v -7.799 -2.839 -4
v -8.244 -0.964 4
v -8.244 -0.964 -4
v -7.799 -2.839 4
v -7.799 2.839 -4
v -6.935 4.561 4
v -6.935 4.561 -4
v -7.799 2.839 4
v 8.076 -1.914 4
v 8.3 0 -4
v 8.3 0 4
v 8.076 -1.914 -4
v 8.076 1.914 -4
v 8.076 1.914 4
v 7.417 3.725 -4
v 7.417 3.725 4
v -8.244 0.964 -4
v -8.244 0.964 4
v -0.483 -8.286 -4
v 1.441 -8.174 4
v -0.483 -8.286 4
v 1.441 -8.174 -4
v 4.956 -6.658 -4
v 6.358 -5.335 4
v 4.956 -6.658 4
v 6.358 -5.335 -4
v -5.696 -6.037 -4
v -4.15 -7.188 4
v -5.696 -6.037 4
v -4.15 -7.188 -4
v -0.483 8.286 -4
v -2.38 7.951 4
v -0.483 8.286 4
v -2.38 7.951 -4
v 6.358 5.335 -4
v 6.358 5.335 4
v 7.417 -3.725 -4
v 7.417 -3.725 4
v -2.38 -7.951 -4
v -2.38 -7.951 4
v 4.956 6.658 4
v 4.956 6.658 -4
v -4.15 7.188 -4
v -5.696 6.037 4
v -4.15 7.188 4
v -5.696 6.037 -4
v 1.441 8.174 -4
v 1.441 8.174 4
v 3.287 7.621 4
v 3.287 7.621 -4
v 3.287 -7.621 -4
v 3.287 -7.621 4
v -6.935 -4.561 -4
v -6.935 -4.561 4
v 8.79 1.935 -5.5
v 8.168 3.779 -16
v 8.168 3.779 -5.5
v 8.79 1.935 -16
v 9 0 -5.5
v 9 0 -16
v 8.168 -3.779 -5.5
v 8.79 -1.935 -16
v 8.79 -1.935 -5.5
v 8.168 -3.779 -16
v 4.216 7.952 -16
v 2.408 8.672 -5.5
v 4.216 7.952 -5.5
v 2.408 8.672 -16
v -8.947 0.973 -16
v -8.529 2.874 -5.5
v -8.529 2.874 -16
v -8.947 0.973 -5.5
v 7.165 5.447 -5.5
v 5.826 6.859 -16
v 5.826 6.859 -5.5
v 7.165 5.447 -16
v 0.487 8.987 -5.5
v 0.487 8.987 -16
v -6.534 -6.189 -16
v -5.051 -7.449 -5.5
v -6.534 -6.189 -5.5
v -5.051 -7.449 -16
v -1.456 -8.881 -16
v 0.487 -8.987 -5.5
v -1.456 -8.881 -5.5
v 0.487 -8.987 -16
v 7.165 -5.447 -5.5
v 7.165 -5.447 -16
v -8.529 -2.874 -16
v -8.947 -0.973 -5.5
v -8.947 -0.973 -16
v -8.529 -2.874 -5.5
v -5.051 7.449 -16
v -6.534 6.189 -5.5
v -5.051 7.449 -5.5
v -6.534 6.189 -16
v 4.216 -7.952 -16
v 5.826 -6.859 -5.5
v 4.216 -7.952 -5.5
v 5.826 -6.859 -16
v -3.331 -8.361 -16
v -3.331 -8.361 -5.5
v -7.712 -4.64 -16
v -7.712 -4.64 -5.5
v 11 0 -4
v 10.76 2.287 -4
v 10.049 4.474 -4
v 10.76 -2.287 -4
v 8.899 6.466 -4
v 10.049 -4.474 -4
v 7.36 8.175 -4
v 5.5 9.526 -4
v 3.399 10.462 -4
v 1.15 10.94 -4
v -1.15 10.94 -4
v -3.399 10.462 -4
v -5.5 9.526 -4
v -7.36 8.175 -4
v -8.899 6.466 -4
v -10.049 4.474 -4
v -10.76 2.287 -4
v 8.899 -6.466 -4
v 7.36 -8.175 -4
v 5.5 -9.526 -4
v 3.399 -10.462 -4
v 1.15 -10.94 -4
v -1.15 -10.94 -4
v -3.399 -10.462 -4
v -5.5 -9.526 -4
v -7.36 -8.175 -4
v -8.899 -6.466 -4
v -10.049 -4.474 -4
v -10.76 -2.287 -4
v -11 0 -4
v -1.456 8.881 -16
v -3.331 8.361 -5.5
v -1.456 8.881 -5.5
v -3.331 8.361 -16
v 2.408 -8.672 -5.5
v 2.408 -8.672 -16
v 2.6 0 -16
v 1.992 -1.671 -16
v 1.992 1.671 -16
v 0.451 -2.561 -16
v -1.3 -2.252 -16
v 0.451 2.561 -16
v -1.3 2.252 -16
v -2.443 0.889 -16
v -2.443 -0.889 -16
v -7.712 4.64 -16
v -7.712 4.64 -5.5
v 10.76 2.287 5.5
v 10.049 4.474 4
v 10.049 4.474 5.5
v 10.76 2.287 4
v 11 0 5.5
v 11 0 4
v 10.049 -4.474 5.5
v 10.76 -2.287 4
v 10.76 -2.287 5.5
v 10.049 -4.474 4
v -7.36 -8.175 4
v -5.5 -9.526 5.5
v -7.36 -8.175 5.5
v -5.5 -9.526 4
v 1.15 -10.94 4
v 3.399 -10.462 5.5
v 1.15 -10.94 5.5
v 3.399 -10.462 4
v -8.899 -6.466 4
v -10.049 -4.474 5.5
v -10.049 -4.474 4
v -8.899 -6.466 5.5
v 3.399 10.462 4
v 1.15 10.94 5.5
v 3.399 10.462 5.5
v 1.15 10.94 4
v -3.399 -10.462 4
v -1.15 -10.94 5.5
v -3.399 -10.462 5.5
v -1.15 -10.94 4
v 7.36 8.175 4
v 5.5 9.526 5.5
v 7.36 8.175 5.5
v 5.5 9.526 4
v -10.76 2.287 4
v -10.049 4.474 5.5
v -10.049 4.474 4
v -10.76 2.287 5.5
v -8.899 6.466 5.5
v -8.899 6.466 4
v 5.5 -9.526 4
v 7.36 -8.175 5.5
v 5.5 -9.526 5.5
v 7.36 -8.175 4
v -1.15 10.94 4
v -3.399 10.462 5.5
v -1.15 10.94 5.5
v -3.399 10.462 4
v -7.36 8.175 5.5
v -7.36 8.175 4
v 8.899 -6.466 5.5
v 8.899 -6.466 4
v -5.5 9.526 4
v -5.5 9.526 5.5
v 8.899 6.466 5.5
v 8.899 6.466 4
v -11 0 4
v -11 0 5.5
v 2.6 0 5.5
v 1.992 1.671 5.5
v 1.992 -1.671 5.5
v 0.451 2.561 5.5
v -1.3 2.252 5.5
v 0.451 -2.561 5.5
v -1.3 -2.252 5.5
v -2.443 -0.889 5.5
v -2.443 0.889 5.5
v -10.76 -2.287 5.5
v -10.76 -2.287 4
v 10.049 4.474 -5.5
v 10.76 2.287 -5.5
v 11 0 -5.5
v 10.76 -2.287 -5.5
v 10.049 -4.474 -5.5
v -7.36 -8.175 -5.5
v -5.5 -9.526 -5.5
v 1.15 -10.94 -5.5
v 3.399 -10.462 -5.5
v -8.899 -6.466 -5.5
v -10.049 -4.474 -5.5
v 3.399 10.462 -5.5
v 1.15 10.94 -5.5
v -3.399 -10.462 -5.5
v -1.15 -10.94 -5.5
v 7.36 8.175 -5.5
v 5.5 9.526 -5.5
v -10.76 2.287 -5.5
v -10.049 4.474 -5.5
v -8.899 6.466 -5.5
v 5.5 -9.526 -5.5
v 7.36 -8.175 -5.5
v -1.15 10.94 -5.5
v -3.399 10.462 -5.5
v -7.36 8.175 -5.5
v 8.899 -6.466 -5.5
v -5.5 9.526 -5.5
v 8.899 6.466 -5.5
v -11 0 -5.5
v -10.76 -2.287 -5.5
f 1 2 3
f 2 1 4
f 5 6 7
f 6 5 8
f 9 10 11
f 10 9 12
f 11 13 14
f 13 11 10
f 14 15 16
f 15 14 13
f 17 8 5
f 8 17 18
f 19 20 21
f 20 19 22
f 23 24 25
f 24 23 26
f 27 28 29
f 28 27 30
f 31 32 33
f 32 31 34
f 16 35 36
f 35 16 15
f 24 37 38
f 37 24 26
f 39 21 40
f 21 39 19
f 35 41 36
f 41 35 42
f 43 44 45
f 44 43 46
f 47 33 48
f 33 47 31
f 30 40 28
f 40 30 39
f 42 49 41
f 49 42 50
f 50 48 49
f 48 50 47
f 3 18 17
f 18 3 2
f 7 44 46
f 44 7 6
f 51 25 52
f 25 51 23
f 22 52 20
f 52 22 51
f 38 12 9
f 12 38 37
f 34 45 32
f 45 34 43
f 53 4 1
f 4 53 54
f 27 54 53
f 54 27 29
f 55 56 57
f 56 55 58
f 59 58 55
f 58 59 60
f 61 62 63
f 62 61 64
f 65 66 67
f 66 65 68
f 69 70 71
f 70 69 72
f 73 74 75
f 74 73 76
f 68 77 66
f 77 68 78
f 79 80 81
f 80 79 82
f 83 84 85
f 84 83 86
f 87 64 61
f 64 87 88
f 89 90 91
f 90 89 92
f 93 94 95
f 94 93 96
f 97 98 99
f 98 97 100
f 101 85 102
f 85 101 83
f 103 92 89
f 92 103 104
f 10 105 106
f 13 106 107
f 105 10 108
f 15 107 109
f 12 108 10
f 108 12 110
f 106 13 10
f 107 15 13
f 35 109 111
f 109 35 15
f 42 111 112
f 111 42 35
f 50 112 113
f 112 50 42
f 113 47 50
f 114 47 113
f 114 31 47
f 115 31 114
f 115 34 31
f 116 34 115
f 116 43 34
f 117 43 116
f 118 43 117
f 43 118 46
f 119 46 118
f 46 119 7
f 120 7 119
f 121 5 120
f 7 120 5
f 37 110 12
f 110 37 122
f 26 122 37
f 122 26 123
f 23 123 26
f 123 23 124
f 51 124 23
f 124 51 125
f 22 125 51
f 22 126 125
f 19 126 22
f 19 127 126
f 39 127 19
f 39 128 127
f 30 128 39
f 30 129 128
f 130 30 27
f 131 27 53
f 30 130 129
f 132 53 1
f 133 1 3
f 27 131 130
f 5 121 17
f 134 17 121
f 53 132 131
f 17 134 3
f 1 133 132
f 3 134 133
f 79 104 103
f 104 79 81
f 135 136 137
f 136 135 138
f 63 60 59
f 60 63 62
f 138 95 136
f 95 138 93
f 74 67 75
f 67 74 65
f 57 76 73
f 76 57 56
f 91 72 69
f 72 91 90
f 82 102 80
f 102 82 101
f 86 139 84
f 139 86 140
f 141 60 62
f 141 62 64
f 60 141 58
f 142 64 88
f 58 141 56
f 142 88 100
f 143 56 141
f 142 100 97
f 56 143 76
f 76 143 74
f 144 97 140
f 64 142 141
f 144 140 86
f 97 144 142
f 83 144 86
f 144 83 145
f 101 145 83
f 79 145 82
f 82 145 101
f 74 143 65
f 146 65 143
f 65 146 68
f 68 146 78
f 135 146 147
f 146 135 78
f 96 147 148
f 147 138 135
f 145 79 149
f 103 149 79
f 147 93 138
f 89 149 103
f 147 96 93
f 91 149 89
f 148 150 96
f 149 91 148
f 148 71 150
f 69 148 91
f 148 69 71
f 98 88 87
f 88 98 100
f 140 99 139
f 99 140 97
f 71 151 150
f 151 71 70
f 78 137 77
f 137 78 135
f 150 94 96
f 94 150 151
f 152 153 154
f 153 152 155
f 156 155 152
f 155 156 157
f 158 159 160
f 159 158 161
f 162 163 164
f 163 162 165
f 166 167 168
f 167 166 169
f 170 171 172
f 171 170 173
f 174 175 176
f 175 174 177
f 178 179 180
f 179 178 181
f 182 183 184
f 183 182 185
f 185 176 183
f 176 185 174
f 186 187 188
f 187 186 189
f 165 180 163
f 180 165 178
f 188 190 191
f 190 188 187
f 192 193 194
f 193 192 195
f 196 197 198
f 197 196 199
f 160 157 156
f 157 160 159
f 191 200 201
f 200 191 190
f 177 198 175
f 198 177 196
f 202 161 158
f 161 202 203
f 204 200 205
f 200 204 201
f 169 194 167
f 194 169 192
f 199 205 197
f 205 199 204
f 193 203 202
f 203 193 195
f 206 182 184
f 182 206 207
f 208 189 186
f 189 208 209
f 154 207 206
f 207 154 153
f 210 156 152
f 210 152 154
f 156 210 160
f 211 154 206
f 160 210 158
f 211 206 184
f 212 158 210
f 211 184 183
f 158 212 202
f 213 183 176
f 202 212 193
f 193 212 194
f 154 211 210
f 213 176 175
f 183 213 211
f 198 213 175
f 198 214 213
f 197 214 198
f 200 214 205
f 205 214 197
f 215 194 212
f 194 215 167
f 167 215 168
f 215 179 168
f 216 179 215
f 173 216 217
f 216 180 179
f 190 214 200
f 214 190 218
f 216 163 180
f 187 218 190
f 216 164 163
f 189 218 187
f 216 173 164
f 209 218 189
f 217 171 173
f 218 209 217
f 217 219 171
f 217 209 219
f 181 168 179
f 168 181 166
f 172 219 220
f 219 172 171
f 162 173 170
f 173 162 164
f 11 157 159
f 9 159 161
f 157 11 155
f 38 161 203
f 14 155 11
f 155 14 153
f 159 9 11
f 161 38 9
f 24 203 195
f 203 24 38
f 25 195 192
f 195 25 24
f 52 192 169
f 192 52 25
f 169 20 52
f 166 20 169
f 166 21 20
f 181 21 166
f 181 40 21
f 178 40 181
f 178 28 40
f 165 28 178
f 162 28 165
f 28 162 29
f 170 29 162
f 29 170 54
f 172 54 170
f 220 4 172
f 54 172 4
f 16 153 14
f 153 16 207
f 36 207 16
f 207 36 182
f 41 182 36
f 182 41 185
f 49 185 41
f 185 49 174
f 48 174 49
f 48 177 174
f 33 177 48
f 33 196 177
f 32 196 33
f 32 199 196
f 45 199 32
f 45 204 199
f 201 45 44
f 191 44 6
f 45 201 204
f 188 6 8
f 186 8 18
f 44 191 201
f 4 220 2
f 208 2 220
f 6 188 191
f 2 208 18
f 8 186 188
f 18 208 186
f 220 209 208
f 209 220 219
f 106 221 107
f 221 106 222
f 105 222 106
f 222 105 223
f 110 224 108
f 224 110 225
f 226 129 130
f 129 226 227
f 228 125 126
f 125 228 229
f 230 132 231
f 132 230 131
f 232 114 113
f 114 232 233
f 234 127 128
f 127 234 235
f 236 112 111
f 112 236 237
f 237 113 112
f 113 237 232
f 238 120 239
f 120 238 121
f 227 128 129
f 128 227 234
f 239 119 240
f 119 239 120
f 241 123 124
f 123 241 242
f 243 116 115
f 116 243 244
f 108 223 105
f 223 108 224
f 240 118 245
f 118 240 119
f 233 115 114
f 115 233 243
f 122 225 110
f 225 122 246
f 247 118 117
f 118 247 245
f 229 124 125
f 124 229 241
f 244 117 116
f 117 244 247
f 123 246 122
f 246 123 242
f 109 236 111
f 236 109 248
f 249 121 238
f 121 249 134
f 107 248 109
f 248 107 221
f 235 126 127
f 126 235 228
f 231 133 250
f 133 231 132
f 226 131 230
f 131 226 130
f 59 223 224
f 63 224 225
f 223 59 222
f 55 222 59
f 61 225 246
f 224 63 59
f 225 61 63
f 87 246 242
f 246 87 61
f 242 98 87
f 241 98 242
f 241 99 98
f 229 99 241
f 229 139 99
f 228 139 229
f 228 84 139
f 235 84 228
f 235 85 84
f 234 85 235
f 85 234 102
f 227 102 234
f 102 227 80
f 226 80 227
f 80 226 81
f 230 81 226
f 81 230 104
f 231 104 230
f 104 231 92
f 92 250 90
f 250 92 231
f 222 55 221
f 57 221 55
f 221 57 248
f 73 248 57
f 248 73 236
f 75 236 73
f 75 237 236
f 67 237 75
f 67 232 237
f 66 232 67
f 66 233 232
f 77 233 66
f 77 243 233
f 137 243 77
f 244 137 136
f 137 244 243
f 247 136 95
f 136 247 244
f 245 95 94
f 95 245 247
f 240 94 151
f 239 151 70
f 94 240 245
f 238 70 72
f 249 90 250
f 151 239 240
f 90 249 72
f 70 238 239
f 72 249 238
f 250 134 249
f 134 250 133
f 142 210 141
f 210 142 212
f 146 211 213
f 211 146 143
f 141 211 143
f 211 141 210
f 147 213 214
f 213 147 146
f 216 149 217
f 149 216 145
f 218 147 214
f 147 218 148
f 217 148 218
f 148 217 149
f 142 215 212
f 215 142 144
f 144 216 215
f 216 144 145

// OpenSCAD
// Parameters
tooth_count = 10; //[5:40:1]
pitch_diameter_mm = 15; //[7.5:30:0.1]
pitch_radius_mm = 7.5; //[3.75:15:0.1]
belt_pitch_mm = 2; //[1:5:0.1]
pulley_width_mm = 10; //[5:30:0.5]
tooth_depth_mm = 0.8; //[0.4:1.6:0.05]
tooth_width_mm = 1.5; //[0.8:3:0.05]
tooth_profile_scale_mm = 1; //[0.5:2:0.05]
bore_diameter_mm = 5; //[2.5:10:0.1]
hub_diameter_mm = 18; //[10:36:0.5]
hub_length_mm = 12; //[6:24:0.5]
flange_diameter_mm = 22; //[12:44:0.5]
flange_thickness_mm = 1.5; //[0.8:4:0.1]
rim_outer_radius_mm = 8.3; //[6:16:0.1]
rim_inner_radius_mm = 6.7; //[4:14:0.1]
core_radius_mm = 6.6; //[3:14:0.1]
overlap_mm = 1; //[0.5:2:0.1]
tolerances_mm = 0.2; //[0:0.6:0.05]

// Pulley Core Body
module pulley_core_body() {
  color("Silver") {
    translate([0, 0, 0])
      cylinder(r=core_radius_mm, h=pulley_width_mm, center=true);
  }
}

// Toothed Rim
module toothed_rim() {
  color("Silver") {
    translate([0, 0, 0])
      cylinder(r=rim_outer_radius_mm, h=pulley_width_mm, center=true);
  }
}

// Printed Pulley Teeth From Profile
module printed_pulley_teeth_from_profile() {
  color("Silver") {
    linear_extrude(height=pulley_width_mm, center=true) {
      polygon(points=[
        [-tooth_width_mm/2*tooth_profile_scale_mm, 0],
        [tooth_width_mm/2*tooth_profile_scale_mm, 0],
        [tooth_width_mm/2*tooth_profile_scale_mm, tooth_depth_mm*tooth_profile_scale_mm],
        [0, tooth_depth_mm*1.25*tooth_profile_scale_mm],
        [-tooth_width_mm/2*tooth_profile_scale_mm, tooth_depth_mm*tooth_profile_scale_mm]
      ]);
    }
  }
}

// Printed Pulley GT2 Teeth
module printed_pulley_GT2_teeth() {
  color("Silver") {
    linear_extrude(height=pulley_width_mm, center=true) {
      polygon(points=[
        [-tooth_width_mm/2, 0],
        [tooth_width_mm/2, 0],
        [tooth_width_mm/2, tooth_depth_mm],
        [0, tooth_depth_mm*1.25],
        [-tooth_width_mm/2, tooth_depth_mm]
      ]);
    }
  }
}

// Printed Pulley Teeth
module printed_pulley_teeth() {
  union() {
    printed_pulley_GT2_teeth();
    printed_pulley_teeth_from_profile();
  }
}

// Hub
module hub() {
  color("Silver") {
    translate([0, 0, -pulley_width_mm/2 - hub_length_mm/2 + overlap_mm])
      cylinder(r=hub_diameter_mm/2, h=hub_length_mm, center=true);
  }
}

// Flange Top
module flange_top() {
  color("Silver") {
    translate([0, 0, pulley_width_mm/2 + flange_thickness_mm/2 - overlap_mm])
      cylinder(r=flange_diameter_mm/2, h=flange_thickness_mm, center=true);
  }
}

// Flange Bottom
module flange_bottom() {
  color("Silver") {
    translate([0, 0, -pulley_width_mm/2 - flange_thickness_mm/2 + overlap_mm])
      cylinder(r=flange_diameter_mm/2, h=flange_thickness_mm, center=true);
  }
}

// Central Bore
module central_bore() {
  translate([0, 0, -hub_length_mm/2])
    cylinder(r=(bore_diameter_mm + tolerances_mm)/2, h=pulley_width_mm + hub_length_mm + 2*flange_thickness_mm + 4*overlap_mm, center=true);
}

// Pulley Assembly
module pulley() {
  difference() {
    union() {
      pulley_core_body();
      toothed_rim();
      hub();
      flange_top();
      flange_bottom();
      // Teeth array
      for (i = [0:tooth_count-1]) {
        rotate([0, 0, i*360/tooth_count])
          translate([rim_inner_radius_mm + tooth_depth_mm/2 - overlap_mm, 0, 0])
          printed_pulley_teeth();
      }
    }
    central_bore();
  }
}

// Final Assembly
module assembly() {
  pulley();
}

assembly();
